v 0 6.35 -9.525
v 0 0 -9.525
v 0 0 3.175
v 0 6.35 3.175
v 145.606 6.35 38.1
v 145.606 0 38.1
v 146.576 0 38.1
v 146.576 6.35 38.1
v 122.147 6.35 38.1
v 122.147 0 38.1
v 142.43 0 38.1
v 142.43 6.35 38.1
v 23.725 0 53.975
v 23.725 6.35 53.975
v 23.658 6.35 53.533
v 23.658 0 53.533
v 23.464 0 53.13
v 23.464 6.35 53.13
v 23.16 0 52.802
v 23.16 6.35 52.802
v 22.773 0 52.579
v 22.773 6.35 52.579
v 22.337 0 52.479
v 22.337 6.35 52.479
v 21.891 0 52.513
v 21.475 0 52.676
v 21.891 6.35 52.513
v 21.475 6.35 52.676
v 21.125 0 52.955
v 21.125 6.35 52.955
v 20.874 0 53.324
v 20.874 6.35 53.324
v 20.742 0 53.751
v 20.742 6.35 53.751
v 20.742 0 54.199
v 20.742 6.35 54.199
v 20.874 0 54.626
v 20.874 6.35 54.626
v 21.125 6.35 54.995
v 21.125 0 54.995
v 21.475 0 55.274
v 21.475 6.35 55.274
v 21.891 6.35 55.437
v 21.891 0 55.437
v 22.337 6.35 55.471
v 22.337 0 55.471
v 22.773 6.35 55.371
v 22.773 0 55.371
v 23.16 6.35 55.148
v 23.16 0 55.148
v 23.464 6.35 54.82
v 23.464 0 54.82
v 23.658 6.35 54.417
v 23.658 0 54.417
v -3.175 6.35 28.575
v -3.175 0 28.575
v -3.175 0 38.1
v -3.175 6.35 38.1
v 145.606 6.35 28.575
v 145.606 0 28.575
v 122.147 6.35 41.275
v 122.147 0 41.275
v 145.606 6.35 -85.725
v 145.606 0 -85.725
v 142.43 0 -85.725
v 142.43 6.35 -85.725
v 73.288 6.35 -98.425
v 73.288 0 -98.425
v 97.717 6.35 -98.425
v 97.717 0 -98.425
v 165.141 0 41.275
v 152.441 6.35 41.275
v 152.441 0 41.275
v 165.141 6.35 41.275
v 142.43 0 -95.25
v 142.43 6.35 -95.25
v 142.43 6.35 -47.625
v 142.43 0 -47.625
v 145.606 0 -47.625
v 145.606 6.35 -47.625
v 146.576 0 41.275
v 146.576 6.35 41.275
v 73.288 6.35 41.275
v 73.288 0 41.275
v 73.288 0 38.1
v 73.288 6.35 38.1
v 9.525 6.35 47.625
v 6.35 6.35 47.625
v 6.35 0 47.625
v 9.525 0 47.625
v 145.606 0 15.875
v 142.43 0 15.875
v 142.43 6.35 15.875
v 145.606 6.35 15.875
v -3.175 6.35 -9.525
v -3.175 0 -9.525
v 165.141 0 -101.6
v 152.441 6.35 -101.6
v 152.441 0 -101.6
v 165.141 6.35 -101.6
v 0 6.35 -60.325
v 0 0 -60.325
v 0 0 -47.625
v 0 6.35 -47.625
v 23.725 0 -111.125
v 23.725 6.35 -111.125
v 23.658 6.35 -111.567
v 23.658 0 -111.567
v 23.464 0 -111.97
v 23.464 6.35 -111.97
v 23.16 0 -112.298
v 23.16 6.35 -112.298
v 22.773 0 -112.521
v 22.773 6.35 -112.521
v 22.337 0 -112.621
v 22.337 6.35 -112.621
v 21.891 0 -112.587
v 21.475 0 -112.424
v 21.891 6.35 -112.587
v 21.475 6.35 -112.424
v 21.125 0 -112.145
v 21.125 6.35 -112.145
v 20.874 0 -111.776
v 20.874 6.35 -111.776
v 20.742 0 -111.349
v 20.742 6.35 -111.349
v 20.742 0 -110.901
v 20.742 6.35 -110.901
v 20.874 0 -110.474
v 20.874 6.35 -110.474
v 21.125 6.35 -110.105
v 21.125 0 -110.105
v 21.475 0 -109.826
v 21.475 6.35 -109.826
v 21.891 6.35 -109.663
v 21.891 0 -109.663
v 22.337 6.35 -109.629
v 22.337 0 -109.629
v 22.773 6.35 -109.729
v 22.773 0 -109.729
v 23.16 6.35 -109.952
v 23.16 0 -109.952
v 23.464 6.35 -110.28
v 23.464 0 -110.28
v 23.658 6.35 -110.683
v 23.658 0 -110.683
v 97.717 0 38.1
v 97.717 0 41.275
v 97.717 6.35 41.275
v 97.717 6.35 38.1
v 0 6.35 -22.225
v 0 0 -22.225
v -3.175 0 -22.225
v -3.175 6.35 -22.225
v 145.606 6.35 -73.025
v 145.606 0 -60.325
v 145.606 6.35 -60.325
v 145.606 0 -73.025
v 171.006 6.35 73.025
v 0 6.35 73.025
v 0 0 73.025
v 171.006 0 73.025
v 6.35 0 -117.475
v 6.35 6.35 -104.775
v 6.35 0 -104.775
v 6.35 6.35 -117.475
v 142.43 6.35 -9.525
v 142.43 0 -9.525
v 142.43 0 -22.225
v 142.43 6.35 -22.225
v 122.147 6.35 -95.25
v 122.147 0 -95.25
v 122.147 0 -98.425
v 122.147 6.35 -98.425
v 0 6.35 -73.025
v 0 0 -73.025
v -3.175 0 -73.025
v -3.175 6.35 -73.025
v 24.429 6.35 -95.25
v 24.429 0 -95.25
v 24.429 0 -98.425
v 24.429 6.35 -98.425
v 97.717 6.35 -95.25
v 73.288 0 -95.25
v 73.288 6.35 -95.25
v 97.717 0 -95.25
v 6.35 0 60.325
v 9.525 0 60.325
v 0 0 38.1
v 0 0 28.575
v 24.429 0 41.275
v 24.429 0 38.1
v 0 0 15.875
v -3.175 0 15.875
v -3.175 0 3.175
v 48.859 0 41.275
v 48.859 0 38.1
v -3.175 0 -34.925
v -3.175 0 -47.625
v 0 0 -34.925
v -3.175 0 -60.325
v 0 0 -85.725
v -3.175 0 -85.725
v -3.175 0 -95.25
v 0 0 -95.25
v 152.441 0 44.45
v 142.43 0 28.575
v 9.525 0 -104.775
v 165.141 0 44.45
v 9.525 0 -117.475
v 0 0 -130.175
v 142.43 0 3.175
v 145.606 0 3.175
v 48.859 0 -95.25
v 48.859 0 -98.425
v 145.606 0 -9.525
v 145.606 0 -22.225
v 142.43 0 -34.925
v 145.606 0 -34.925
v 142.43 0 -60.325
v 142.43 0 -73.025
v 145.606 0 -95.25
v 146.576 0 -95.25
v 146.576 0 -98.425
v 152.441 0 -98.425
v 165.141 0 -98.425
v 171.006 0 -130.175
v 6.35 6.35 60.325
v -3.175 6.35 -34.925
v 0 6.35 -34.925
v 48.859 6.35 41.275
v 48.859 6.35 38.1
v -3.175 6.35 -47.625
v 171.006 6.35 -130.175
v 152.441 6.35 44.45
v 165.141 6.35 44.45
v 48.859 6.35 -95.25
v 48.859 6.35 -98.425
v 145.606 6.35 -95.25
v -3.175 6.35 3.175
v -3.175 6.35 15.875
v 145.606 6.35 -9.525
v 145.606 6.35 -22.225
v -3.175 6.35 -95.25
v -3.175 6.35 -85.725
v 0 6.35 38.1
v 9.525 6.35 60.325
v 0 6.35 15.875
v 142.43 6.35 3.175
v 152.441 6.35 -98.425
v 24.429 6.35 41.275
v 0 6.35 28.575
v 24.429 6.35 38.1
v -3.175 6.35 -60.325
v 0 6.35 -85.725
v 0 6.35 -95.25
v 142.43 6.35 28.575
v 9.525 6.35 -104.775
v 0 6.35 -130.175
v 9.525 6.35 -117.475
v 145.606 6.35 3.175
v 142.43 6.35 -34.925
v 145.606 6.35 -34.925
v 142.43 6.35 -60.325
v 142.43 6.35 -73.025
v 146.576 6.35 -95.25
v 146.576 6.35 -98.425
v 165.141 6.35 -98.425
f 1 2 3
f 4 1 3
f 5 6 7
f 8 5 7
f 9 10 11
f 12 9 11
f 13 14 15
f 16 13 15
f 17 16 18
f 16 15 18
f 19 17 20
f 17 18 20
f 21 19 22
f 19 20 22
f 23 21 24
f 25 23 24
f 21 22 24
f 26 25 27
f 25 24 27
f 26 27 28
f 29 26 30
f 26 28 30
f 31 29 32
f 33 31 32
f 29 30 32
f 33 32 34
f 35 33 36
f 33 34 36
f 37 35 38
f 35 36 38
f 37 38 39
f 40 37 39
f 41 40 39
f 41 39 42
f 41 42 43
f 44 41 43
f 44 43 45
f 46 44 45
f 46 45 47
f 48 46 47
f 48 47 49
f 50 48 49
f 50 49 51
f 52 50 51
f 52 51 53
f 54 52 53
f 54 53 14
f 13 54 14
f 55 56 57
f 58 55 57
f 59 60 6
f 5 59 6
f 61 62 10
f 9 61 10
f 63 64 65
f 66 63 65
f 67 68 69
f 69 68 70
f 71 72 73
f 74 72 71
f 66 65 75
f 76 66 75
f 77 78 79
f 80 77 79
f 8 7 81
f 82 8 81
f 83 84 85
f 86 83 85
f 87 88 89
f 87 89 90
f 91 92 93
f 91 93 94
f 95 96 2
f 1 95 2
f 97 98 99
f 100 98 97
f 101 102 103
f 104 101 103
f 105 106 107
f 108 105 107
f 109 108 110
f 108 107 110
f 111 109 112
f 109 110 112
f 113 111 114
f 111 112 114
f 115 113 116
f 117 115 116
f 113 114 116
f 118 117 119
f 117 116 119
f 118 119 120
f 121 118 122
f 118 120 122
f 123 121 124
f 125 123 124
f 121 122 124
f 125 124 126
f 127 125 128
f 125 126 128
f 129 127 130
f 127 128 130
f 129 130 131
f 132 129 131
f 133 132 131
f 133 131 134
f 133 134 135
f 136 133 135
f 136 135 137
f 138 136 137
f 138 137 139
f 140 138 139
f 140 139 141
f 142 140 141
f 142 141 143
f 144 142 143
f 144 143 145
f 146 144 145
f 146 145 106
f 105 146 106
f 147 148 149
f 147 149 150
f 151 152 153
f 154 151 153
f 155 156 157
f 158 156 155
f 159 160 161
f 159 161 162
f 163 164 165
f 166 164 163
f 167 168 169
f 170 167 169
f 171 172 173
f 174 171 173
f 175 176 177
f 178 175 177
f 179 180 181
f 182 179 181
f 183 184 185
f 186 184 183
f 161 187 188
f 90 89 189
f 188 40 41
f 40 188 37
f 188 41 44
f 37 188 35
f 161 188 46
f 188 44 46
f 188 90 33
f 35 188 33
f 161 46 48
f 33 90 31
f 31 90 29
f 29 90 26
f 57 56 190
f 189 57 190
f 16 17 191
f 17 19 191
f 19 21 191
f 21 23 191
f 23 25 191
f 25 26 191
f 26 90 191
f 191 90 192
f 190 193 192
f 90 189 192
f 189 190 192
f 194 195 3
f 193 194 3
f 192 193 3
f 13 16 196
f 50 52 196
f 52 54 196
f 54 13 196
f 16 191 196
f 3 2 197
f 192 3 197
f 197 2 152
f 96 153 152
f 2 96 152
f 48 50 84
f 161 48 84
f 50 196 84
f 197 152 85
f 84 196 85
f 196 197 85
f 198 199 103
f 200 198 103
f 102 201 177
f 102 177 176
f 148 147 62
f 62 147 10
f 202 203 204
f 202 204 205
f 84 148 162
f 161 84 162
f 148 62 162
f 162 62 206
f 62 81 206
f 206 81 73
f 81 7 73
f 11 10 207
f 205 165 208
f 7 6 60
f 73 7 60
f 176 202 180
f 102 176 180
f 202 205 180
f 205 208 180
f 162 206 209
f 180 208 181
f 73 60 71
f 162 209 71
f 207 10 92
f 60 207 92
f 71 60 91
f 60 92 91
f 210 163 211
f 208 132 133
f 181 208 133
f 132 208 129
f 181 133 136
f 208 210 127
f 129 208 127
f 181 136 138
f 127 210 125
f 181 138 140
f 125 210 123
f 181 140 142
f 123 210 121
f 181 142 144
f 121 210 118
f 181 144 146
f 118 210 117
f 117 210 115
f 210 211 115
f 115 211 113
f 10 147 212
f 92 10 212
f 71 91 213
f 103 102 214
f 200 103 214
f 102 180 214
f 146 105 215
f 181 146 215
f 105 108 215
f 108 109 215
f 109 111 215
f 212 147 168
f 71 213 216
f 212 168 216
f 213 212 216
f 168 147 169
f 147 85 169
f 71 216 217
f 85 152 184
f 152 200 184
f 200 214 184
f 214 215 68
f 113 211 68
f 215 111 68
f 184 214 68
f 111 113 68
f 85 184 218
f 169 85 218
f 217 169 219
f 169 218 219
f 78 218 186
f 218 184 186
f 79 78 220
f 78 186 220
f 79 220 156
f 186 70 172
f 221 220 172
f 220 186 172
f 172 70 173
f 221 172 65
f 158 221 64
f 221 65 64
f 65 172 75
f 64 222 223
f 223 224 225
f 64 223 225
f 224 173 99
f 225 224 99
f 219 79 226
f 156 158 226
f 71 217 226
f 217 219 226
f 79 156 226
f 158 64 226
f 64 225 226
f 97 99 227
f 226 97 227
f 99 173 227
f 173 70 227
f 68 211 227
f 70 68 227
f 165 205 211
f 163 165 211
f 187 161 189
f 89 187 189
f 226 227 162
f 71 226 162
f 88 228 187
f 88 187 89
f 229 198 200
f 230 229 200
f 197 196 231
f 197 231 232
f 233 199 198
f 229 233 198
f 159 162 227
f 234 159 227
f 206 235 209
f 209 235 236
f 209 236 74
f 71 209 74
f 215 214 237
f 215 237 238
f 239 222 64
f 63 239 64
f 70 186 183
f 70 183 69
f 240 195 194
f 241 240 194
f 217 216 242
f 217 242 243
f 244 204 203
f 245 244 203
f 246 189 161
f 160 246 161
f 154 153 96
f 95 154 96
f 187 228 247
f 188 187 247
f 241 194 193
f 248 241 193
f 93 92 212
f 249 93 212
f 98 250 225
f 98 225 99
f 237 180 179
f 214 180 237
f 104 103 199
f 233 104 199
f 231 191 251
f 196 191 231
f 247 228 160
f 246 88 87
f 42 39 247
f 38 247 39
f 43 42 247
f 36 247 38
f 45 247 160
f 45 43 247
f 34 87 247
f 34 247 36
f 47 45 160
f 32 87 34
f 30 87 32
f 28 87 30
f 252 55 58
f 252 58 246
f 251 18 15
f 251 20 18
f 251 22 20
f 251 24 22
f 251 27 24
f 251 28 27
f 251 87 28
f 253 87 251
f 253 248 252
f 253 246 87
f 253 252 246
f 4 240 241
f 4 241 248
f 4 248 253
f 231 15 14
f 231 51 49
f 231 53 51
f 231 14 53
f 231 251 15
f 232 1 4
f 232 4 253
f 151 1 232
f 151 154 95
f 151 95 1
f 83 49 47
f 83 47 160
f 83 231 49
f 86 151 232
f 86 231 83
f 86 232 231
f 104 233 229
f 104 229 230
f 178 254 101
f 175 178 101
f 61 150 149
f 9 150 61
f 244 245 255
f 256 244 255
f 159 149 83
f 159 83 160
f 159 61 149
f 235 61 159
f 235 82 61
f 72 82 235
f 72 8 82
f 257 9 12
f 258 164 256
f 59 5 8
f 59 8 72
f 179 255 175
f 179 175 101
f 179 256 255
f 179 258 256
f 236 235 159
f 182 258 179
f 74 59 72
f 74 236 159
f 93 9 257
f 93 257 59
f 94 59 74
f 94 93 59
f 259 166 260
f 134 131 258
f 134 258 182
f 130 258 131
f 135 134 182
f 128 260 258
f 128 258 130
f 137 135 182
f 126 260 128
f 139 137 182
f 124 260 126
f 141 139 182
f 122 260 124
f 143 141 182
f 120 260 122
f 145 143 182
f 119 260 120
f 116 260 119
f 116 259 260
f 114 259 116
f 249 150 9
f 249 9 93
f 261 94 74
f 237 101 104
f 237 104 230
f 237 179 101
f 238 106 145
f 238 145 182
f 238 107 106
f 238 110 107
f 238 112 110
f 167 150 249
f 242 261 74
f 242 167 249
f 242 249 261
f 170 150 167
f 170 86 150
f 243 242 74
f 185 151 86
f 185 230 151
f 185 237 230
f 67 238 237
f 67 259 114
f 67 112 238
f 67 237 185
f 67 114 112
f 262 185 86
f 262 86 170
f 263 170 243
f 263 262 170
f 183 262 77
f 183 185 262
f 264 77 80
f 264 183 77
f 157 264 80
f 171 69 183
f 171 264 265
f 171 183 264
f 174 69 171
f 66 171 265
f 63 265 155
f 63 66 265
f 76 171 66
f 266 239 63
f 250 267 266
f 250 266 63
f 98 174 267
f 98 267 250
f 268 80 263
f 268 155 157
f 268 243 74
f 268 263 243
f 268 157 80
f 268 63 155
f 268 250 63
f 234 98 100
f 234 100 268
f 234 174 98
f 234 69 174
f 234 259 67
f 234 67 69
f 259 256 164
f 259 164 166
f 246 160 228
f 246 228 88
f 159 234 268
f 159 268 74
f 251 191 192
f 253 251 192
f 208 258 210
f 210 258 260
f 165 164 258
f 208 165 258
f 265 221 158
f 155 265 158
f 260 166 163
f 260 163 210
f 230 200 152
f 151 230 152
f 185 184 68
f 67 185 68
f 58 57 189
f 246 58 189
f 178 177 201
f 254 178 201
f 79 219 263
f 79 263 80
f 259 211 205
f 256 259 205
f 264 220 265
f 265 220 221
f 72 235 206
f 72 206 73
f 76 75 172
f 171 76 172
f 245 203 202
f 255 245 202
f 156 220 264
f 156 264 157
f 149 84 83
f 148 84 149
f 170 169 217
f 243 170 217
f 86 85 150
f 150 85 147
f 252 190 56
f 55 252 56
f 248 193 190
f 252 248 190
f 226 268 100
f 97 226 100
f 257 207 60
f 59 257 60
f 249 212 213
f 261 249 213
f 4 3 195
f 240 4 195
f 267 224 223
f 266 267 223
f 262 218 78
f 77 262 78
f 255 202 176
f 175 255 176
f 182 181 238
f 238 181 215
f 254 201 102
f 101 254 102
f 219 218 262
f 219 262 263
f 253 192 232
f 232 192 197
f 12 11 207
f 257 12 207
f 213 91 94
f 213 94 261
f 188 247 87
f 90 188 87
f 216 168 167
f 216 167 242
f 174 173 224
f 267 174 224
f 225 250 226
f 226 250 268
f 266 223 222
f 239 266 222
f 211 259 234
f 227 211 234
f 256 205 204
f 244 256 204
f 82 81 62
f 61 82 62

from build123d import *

# Parameters (mm, degrees)
SKETCH1_W           = 24.429357143
SKETCH1_H           = 3.175
SKETCH1_W_2         = 24.429357142
SKETCH1_W_3         = 3.175
SKETCH1_H_2         = 12.7
BOSS_EXTRUDE1_DEPTH = 6.35
SKETCH2_R           = 1.499997
SKETCH2_R_2         = 1.5
SKETCH2_W           = 12.7
SKETCH2_H           = 3.175
SKETCH2_W_2         = 3.175
SKETCH2_H_2         = 12.7
CUT_EXTRUDE1_DEPTH  = 7.35
SKETCH3_W           = 171.0055
SKETCH3_H           = 101.6
SKETCH3_H_2         = 44.45
CUT_EXTRUDE2_DEPTH  = 7.35


with BuildPart() as part:
    # Sketch1 → Boss-Extrude1 (new body)
    with BuildSketch(Plane(origin=(0, 0, 0), x_dir=(1, 0, 0), z_dir=(0, 1, 0))):
        Polygon((0, 174.625), (0, 95.25), (-3.175, 95.25), (-3.175, 85.725), (0, 85.725), (0, 73.025), (-3.175, 73.025), (-3.175, 60.325), (0, 60.325), (0, 47.625), (-3.175, 47.625), (-3.175, 34.925), (0, 34.925), (0, 22.225), (-3.175, 22.225), (-3.175, 9.525), (0, 9.525), (0, -3.175), (-3.175, -3.175), (-3.175, -15.875), (0, -15.875), (0, -28.575), (-3.175, -28.575), (-3.175, -38.1), (0, -38.1), (0, -174.625), (171.0055, -174.625), (171.0055, 174.625), align=None)
        with Locations((36.644035714, -39.6875)):
            Rectangle(SKETCH1_W, SKETCH1_H, mode=Mode.SUBTRACT)
        with Locations((85.50275, -39.6875)):
            Rectangle(SKETCH1_W_2, SKETCH1_H, mode=Mode.SUBTRACT)
        Polygon((122.146785714, -38.1), (142.4305, -38.1), (142.4305, -28.575), (145.6055, -28.575), (145.6055, -38.1), (146.576142857, -38.1), (146.576142857, -41.275), (122.146785714, -41.275), align=None, mode=Mode.SUBTRACT)
        with Locations((144.018, -9.525)):
            Rectangle(SKETCH1_W_3, SKETCH1_H_2, mode=Mode.SUBTRACT)
        with Locations((144.018, 15.875)):
            Rectangle(SKETCH1_W_3, SKETCH1_H_2, mode=Mode.SUBTRACT)
        with Locations((144.018, 41.275)):
            Rectangle(SKETCH1_W_3, SKETCH1_H_2, mode=Mode.SUBTRACT)
        with Locations((144.018, 66.675)):
            Rectangle(SKETCH1_W_3, SKETCH1_H_2, mode=Mode.SUBTRACT)
        Polygon((142.4305, 85.725), (142.4305, 95.25), (122.146785714, 95.25), (122.146785714, 98.425), (146.576142857, 98.425), (146.576142857, 95.25), (145.6055, 95.25), (145.6055, 85.725), align=None, mode=Mode.SUBTRACT)
        with Locations((85.50275, 96.8375)):
            Rectangle(SKETCH1_W_2, SKETCH1_H, mode=Mode.SUBTRACT)
        with Locations((36.644035714, 96.8375)):
            Rectangle(SKETCH1_W, SKETCH1_H, mode=Mode.SUBTRACT)
    extrude(amount=BOSS_EXTRUDE1_DEPTH)

    # Sketch2 → Cut-Extrude1 (cut, through all)
    with BuildSketch(Plane(origin=(0, 6.35, 0), x_dir=(1, 0, 0), z_dir=(0, 1, 0))):
        with Locations((9.525, -165.1)):
            Circle(SKETCH2_R)
        with Locations((9.525, 165.1)):
            Circle(SKETCH2_R)
        with Locations((22.225, -53.975)):
            Circle(SKETCH2_R_2)
        with Locations((22.225, 111.125)):
            Circle(SKETCH2_R_2)
        with Locations((158.790821429, -42.8625)):
            Rectangle(SKETCH2_W, SKETCH2_H)
        with Locations((158.790821429, 100.0125)):
            Rectangle(SKETCH2_W, SKETCH2_H)
        with Locations((7.9375, -53.975)):
            Rectangle(SKETCH2_W_2, SKETCH2_H_2)
        with Locations((7.9375, 111.125)):
            Rectangle(SKETCH2_W_2, SKETCH2_H_2)
    extrude(amount=-CUT_EXTRUDE1_DEPTH, mode=Mode.SUBTRACT)

    # Sketch3 → Cut-Extrude2 (cut, through all)
    with BuildSketch(Plane(origin=(0, 6.35, 0), x_dir=(1, 0, 0), z_dir=(0, 1, 0))):
        with Locations((85.50275, -123.825)):
            Rectangle(SKETCH3_W, SKETCH3_H)
        with Locations((85.50275, 152.4)):
            Rectangle(SKETCH3_W, SKETCH3_H_2)
    extrude(amount=-CUT_EXTRUDE2_DEPTH, mode=Mode.SUBTRACT)


solid = part.part
